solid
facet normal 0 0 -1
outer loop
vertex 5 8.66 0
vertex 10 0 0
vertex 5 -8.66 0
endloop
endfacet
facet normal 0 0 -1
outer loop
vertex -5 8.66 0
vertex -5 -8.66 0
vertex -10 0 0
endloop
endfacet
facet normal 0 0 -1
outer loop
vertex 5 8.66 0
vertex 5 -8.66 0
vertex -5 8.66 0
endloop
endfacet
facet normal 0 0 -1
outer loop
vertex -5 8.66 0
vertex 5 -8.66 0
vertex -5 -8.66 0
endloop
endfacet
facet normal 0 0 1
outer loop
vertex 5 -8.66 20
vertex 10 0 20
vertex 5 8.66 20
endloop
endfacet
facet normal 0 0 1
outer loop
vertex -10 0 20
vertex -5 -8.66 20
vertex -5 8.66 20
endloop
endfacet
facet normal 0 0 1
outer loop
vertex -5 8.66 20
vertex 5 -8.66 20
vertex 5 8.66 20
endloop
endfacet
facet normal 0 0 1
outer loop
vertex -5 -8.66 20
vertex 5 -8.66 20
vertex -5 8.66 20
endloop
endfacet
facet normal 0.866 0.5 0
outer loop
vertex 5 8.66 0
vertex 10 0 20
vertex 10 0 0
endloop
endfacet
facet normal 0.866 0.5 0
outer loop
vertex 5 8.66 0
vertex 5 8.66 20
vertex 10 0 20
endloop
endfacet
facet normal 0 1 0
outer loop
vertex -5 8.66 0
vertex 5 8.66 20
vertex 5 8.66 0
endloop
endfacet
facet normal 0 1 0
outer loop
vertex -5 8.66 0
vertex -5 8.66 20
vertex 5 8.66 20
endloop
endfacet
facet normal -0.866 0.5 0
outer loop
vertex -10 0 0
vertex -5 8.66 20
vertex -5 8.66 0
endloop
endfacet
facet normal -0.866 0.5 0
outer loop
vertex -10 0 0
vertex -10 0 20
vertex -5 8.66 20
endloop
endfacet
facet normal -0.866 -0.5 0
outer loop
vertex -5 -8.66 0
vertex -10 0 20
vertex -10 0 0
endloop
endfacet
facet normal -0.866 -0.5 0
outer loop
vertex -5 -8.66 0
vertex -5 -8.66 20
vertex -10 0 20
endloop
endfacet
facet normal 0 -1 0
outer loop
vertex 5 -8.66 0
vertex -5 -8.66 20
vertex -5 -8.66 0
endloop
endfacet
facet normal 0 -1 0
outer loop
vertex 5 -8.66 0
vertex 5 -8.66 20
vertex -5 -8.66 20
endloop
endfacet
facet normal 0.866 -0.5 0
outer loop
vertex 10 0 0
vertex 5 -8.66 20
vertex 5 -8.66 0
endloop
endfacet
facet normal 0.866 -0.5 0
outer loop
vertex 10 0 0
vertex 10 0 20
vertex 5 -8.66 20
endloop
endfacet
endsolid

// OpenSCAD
// param: size=10, height=20
module hexagonal_prism(size=10, height=20) {
    linear_extrude(height=height) circle(r=size, $fn=6);
}
hexagonal_prism(size=10, height=20);
